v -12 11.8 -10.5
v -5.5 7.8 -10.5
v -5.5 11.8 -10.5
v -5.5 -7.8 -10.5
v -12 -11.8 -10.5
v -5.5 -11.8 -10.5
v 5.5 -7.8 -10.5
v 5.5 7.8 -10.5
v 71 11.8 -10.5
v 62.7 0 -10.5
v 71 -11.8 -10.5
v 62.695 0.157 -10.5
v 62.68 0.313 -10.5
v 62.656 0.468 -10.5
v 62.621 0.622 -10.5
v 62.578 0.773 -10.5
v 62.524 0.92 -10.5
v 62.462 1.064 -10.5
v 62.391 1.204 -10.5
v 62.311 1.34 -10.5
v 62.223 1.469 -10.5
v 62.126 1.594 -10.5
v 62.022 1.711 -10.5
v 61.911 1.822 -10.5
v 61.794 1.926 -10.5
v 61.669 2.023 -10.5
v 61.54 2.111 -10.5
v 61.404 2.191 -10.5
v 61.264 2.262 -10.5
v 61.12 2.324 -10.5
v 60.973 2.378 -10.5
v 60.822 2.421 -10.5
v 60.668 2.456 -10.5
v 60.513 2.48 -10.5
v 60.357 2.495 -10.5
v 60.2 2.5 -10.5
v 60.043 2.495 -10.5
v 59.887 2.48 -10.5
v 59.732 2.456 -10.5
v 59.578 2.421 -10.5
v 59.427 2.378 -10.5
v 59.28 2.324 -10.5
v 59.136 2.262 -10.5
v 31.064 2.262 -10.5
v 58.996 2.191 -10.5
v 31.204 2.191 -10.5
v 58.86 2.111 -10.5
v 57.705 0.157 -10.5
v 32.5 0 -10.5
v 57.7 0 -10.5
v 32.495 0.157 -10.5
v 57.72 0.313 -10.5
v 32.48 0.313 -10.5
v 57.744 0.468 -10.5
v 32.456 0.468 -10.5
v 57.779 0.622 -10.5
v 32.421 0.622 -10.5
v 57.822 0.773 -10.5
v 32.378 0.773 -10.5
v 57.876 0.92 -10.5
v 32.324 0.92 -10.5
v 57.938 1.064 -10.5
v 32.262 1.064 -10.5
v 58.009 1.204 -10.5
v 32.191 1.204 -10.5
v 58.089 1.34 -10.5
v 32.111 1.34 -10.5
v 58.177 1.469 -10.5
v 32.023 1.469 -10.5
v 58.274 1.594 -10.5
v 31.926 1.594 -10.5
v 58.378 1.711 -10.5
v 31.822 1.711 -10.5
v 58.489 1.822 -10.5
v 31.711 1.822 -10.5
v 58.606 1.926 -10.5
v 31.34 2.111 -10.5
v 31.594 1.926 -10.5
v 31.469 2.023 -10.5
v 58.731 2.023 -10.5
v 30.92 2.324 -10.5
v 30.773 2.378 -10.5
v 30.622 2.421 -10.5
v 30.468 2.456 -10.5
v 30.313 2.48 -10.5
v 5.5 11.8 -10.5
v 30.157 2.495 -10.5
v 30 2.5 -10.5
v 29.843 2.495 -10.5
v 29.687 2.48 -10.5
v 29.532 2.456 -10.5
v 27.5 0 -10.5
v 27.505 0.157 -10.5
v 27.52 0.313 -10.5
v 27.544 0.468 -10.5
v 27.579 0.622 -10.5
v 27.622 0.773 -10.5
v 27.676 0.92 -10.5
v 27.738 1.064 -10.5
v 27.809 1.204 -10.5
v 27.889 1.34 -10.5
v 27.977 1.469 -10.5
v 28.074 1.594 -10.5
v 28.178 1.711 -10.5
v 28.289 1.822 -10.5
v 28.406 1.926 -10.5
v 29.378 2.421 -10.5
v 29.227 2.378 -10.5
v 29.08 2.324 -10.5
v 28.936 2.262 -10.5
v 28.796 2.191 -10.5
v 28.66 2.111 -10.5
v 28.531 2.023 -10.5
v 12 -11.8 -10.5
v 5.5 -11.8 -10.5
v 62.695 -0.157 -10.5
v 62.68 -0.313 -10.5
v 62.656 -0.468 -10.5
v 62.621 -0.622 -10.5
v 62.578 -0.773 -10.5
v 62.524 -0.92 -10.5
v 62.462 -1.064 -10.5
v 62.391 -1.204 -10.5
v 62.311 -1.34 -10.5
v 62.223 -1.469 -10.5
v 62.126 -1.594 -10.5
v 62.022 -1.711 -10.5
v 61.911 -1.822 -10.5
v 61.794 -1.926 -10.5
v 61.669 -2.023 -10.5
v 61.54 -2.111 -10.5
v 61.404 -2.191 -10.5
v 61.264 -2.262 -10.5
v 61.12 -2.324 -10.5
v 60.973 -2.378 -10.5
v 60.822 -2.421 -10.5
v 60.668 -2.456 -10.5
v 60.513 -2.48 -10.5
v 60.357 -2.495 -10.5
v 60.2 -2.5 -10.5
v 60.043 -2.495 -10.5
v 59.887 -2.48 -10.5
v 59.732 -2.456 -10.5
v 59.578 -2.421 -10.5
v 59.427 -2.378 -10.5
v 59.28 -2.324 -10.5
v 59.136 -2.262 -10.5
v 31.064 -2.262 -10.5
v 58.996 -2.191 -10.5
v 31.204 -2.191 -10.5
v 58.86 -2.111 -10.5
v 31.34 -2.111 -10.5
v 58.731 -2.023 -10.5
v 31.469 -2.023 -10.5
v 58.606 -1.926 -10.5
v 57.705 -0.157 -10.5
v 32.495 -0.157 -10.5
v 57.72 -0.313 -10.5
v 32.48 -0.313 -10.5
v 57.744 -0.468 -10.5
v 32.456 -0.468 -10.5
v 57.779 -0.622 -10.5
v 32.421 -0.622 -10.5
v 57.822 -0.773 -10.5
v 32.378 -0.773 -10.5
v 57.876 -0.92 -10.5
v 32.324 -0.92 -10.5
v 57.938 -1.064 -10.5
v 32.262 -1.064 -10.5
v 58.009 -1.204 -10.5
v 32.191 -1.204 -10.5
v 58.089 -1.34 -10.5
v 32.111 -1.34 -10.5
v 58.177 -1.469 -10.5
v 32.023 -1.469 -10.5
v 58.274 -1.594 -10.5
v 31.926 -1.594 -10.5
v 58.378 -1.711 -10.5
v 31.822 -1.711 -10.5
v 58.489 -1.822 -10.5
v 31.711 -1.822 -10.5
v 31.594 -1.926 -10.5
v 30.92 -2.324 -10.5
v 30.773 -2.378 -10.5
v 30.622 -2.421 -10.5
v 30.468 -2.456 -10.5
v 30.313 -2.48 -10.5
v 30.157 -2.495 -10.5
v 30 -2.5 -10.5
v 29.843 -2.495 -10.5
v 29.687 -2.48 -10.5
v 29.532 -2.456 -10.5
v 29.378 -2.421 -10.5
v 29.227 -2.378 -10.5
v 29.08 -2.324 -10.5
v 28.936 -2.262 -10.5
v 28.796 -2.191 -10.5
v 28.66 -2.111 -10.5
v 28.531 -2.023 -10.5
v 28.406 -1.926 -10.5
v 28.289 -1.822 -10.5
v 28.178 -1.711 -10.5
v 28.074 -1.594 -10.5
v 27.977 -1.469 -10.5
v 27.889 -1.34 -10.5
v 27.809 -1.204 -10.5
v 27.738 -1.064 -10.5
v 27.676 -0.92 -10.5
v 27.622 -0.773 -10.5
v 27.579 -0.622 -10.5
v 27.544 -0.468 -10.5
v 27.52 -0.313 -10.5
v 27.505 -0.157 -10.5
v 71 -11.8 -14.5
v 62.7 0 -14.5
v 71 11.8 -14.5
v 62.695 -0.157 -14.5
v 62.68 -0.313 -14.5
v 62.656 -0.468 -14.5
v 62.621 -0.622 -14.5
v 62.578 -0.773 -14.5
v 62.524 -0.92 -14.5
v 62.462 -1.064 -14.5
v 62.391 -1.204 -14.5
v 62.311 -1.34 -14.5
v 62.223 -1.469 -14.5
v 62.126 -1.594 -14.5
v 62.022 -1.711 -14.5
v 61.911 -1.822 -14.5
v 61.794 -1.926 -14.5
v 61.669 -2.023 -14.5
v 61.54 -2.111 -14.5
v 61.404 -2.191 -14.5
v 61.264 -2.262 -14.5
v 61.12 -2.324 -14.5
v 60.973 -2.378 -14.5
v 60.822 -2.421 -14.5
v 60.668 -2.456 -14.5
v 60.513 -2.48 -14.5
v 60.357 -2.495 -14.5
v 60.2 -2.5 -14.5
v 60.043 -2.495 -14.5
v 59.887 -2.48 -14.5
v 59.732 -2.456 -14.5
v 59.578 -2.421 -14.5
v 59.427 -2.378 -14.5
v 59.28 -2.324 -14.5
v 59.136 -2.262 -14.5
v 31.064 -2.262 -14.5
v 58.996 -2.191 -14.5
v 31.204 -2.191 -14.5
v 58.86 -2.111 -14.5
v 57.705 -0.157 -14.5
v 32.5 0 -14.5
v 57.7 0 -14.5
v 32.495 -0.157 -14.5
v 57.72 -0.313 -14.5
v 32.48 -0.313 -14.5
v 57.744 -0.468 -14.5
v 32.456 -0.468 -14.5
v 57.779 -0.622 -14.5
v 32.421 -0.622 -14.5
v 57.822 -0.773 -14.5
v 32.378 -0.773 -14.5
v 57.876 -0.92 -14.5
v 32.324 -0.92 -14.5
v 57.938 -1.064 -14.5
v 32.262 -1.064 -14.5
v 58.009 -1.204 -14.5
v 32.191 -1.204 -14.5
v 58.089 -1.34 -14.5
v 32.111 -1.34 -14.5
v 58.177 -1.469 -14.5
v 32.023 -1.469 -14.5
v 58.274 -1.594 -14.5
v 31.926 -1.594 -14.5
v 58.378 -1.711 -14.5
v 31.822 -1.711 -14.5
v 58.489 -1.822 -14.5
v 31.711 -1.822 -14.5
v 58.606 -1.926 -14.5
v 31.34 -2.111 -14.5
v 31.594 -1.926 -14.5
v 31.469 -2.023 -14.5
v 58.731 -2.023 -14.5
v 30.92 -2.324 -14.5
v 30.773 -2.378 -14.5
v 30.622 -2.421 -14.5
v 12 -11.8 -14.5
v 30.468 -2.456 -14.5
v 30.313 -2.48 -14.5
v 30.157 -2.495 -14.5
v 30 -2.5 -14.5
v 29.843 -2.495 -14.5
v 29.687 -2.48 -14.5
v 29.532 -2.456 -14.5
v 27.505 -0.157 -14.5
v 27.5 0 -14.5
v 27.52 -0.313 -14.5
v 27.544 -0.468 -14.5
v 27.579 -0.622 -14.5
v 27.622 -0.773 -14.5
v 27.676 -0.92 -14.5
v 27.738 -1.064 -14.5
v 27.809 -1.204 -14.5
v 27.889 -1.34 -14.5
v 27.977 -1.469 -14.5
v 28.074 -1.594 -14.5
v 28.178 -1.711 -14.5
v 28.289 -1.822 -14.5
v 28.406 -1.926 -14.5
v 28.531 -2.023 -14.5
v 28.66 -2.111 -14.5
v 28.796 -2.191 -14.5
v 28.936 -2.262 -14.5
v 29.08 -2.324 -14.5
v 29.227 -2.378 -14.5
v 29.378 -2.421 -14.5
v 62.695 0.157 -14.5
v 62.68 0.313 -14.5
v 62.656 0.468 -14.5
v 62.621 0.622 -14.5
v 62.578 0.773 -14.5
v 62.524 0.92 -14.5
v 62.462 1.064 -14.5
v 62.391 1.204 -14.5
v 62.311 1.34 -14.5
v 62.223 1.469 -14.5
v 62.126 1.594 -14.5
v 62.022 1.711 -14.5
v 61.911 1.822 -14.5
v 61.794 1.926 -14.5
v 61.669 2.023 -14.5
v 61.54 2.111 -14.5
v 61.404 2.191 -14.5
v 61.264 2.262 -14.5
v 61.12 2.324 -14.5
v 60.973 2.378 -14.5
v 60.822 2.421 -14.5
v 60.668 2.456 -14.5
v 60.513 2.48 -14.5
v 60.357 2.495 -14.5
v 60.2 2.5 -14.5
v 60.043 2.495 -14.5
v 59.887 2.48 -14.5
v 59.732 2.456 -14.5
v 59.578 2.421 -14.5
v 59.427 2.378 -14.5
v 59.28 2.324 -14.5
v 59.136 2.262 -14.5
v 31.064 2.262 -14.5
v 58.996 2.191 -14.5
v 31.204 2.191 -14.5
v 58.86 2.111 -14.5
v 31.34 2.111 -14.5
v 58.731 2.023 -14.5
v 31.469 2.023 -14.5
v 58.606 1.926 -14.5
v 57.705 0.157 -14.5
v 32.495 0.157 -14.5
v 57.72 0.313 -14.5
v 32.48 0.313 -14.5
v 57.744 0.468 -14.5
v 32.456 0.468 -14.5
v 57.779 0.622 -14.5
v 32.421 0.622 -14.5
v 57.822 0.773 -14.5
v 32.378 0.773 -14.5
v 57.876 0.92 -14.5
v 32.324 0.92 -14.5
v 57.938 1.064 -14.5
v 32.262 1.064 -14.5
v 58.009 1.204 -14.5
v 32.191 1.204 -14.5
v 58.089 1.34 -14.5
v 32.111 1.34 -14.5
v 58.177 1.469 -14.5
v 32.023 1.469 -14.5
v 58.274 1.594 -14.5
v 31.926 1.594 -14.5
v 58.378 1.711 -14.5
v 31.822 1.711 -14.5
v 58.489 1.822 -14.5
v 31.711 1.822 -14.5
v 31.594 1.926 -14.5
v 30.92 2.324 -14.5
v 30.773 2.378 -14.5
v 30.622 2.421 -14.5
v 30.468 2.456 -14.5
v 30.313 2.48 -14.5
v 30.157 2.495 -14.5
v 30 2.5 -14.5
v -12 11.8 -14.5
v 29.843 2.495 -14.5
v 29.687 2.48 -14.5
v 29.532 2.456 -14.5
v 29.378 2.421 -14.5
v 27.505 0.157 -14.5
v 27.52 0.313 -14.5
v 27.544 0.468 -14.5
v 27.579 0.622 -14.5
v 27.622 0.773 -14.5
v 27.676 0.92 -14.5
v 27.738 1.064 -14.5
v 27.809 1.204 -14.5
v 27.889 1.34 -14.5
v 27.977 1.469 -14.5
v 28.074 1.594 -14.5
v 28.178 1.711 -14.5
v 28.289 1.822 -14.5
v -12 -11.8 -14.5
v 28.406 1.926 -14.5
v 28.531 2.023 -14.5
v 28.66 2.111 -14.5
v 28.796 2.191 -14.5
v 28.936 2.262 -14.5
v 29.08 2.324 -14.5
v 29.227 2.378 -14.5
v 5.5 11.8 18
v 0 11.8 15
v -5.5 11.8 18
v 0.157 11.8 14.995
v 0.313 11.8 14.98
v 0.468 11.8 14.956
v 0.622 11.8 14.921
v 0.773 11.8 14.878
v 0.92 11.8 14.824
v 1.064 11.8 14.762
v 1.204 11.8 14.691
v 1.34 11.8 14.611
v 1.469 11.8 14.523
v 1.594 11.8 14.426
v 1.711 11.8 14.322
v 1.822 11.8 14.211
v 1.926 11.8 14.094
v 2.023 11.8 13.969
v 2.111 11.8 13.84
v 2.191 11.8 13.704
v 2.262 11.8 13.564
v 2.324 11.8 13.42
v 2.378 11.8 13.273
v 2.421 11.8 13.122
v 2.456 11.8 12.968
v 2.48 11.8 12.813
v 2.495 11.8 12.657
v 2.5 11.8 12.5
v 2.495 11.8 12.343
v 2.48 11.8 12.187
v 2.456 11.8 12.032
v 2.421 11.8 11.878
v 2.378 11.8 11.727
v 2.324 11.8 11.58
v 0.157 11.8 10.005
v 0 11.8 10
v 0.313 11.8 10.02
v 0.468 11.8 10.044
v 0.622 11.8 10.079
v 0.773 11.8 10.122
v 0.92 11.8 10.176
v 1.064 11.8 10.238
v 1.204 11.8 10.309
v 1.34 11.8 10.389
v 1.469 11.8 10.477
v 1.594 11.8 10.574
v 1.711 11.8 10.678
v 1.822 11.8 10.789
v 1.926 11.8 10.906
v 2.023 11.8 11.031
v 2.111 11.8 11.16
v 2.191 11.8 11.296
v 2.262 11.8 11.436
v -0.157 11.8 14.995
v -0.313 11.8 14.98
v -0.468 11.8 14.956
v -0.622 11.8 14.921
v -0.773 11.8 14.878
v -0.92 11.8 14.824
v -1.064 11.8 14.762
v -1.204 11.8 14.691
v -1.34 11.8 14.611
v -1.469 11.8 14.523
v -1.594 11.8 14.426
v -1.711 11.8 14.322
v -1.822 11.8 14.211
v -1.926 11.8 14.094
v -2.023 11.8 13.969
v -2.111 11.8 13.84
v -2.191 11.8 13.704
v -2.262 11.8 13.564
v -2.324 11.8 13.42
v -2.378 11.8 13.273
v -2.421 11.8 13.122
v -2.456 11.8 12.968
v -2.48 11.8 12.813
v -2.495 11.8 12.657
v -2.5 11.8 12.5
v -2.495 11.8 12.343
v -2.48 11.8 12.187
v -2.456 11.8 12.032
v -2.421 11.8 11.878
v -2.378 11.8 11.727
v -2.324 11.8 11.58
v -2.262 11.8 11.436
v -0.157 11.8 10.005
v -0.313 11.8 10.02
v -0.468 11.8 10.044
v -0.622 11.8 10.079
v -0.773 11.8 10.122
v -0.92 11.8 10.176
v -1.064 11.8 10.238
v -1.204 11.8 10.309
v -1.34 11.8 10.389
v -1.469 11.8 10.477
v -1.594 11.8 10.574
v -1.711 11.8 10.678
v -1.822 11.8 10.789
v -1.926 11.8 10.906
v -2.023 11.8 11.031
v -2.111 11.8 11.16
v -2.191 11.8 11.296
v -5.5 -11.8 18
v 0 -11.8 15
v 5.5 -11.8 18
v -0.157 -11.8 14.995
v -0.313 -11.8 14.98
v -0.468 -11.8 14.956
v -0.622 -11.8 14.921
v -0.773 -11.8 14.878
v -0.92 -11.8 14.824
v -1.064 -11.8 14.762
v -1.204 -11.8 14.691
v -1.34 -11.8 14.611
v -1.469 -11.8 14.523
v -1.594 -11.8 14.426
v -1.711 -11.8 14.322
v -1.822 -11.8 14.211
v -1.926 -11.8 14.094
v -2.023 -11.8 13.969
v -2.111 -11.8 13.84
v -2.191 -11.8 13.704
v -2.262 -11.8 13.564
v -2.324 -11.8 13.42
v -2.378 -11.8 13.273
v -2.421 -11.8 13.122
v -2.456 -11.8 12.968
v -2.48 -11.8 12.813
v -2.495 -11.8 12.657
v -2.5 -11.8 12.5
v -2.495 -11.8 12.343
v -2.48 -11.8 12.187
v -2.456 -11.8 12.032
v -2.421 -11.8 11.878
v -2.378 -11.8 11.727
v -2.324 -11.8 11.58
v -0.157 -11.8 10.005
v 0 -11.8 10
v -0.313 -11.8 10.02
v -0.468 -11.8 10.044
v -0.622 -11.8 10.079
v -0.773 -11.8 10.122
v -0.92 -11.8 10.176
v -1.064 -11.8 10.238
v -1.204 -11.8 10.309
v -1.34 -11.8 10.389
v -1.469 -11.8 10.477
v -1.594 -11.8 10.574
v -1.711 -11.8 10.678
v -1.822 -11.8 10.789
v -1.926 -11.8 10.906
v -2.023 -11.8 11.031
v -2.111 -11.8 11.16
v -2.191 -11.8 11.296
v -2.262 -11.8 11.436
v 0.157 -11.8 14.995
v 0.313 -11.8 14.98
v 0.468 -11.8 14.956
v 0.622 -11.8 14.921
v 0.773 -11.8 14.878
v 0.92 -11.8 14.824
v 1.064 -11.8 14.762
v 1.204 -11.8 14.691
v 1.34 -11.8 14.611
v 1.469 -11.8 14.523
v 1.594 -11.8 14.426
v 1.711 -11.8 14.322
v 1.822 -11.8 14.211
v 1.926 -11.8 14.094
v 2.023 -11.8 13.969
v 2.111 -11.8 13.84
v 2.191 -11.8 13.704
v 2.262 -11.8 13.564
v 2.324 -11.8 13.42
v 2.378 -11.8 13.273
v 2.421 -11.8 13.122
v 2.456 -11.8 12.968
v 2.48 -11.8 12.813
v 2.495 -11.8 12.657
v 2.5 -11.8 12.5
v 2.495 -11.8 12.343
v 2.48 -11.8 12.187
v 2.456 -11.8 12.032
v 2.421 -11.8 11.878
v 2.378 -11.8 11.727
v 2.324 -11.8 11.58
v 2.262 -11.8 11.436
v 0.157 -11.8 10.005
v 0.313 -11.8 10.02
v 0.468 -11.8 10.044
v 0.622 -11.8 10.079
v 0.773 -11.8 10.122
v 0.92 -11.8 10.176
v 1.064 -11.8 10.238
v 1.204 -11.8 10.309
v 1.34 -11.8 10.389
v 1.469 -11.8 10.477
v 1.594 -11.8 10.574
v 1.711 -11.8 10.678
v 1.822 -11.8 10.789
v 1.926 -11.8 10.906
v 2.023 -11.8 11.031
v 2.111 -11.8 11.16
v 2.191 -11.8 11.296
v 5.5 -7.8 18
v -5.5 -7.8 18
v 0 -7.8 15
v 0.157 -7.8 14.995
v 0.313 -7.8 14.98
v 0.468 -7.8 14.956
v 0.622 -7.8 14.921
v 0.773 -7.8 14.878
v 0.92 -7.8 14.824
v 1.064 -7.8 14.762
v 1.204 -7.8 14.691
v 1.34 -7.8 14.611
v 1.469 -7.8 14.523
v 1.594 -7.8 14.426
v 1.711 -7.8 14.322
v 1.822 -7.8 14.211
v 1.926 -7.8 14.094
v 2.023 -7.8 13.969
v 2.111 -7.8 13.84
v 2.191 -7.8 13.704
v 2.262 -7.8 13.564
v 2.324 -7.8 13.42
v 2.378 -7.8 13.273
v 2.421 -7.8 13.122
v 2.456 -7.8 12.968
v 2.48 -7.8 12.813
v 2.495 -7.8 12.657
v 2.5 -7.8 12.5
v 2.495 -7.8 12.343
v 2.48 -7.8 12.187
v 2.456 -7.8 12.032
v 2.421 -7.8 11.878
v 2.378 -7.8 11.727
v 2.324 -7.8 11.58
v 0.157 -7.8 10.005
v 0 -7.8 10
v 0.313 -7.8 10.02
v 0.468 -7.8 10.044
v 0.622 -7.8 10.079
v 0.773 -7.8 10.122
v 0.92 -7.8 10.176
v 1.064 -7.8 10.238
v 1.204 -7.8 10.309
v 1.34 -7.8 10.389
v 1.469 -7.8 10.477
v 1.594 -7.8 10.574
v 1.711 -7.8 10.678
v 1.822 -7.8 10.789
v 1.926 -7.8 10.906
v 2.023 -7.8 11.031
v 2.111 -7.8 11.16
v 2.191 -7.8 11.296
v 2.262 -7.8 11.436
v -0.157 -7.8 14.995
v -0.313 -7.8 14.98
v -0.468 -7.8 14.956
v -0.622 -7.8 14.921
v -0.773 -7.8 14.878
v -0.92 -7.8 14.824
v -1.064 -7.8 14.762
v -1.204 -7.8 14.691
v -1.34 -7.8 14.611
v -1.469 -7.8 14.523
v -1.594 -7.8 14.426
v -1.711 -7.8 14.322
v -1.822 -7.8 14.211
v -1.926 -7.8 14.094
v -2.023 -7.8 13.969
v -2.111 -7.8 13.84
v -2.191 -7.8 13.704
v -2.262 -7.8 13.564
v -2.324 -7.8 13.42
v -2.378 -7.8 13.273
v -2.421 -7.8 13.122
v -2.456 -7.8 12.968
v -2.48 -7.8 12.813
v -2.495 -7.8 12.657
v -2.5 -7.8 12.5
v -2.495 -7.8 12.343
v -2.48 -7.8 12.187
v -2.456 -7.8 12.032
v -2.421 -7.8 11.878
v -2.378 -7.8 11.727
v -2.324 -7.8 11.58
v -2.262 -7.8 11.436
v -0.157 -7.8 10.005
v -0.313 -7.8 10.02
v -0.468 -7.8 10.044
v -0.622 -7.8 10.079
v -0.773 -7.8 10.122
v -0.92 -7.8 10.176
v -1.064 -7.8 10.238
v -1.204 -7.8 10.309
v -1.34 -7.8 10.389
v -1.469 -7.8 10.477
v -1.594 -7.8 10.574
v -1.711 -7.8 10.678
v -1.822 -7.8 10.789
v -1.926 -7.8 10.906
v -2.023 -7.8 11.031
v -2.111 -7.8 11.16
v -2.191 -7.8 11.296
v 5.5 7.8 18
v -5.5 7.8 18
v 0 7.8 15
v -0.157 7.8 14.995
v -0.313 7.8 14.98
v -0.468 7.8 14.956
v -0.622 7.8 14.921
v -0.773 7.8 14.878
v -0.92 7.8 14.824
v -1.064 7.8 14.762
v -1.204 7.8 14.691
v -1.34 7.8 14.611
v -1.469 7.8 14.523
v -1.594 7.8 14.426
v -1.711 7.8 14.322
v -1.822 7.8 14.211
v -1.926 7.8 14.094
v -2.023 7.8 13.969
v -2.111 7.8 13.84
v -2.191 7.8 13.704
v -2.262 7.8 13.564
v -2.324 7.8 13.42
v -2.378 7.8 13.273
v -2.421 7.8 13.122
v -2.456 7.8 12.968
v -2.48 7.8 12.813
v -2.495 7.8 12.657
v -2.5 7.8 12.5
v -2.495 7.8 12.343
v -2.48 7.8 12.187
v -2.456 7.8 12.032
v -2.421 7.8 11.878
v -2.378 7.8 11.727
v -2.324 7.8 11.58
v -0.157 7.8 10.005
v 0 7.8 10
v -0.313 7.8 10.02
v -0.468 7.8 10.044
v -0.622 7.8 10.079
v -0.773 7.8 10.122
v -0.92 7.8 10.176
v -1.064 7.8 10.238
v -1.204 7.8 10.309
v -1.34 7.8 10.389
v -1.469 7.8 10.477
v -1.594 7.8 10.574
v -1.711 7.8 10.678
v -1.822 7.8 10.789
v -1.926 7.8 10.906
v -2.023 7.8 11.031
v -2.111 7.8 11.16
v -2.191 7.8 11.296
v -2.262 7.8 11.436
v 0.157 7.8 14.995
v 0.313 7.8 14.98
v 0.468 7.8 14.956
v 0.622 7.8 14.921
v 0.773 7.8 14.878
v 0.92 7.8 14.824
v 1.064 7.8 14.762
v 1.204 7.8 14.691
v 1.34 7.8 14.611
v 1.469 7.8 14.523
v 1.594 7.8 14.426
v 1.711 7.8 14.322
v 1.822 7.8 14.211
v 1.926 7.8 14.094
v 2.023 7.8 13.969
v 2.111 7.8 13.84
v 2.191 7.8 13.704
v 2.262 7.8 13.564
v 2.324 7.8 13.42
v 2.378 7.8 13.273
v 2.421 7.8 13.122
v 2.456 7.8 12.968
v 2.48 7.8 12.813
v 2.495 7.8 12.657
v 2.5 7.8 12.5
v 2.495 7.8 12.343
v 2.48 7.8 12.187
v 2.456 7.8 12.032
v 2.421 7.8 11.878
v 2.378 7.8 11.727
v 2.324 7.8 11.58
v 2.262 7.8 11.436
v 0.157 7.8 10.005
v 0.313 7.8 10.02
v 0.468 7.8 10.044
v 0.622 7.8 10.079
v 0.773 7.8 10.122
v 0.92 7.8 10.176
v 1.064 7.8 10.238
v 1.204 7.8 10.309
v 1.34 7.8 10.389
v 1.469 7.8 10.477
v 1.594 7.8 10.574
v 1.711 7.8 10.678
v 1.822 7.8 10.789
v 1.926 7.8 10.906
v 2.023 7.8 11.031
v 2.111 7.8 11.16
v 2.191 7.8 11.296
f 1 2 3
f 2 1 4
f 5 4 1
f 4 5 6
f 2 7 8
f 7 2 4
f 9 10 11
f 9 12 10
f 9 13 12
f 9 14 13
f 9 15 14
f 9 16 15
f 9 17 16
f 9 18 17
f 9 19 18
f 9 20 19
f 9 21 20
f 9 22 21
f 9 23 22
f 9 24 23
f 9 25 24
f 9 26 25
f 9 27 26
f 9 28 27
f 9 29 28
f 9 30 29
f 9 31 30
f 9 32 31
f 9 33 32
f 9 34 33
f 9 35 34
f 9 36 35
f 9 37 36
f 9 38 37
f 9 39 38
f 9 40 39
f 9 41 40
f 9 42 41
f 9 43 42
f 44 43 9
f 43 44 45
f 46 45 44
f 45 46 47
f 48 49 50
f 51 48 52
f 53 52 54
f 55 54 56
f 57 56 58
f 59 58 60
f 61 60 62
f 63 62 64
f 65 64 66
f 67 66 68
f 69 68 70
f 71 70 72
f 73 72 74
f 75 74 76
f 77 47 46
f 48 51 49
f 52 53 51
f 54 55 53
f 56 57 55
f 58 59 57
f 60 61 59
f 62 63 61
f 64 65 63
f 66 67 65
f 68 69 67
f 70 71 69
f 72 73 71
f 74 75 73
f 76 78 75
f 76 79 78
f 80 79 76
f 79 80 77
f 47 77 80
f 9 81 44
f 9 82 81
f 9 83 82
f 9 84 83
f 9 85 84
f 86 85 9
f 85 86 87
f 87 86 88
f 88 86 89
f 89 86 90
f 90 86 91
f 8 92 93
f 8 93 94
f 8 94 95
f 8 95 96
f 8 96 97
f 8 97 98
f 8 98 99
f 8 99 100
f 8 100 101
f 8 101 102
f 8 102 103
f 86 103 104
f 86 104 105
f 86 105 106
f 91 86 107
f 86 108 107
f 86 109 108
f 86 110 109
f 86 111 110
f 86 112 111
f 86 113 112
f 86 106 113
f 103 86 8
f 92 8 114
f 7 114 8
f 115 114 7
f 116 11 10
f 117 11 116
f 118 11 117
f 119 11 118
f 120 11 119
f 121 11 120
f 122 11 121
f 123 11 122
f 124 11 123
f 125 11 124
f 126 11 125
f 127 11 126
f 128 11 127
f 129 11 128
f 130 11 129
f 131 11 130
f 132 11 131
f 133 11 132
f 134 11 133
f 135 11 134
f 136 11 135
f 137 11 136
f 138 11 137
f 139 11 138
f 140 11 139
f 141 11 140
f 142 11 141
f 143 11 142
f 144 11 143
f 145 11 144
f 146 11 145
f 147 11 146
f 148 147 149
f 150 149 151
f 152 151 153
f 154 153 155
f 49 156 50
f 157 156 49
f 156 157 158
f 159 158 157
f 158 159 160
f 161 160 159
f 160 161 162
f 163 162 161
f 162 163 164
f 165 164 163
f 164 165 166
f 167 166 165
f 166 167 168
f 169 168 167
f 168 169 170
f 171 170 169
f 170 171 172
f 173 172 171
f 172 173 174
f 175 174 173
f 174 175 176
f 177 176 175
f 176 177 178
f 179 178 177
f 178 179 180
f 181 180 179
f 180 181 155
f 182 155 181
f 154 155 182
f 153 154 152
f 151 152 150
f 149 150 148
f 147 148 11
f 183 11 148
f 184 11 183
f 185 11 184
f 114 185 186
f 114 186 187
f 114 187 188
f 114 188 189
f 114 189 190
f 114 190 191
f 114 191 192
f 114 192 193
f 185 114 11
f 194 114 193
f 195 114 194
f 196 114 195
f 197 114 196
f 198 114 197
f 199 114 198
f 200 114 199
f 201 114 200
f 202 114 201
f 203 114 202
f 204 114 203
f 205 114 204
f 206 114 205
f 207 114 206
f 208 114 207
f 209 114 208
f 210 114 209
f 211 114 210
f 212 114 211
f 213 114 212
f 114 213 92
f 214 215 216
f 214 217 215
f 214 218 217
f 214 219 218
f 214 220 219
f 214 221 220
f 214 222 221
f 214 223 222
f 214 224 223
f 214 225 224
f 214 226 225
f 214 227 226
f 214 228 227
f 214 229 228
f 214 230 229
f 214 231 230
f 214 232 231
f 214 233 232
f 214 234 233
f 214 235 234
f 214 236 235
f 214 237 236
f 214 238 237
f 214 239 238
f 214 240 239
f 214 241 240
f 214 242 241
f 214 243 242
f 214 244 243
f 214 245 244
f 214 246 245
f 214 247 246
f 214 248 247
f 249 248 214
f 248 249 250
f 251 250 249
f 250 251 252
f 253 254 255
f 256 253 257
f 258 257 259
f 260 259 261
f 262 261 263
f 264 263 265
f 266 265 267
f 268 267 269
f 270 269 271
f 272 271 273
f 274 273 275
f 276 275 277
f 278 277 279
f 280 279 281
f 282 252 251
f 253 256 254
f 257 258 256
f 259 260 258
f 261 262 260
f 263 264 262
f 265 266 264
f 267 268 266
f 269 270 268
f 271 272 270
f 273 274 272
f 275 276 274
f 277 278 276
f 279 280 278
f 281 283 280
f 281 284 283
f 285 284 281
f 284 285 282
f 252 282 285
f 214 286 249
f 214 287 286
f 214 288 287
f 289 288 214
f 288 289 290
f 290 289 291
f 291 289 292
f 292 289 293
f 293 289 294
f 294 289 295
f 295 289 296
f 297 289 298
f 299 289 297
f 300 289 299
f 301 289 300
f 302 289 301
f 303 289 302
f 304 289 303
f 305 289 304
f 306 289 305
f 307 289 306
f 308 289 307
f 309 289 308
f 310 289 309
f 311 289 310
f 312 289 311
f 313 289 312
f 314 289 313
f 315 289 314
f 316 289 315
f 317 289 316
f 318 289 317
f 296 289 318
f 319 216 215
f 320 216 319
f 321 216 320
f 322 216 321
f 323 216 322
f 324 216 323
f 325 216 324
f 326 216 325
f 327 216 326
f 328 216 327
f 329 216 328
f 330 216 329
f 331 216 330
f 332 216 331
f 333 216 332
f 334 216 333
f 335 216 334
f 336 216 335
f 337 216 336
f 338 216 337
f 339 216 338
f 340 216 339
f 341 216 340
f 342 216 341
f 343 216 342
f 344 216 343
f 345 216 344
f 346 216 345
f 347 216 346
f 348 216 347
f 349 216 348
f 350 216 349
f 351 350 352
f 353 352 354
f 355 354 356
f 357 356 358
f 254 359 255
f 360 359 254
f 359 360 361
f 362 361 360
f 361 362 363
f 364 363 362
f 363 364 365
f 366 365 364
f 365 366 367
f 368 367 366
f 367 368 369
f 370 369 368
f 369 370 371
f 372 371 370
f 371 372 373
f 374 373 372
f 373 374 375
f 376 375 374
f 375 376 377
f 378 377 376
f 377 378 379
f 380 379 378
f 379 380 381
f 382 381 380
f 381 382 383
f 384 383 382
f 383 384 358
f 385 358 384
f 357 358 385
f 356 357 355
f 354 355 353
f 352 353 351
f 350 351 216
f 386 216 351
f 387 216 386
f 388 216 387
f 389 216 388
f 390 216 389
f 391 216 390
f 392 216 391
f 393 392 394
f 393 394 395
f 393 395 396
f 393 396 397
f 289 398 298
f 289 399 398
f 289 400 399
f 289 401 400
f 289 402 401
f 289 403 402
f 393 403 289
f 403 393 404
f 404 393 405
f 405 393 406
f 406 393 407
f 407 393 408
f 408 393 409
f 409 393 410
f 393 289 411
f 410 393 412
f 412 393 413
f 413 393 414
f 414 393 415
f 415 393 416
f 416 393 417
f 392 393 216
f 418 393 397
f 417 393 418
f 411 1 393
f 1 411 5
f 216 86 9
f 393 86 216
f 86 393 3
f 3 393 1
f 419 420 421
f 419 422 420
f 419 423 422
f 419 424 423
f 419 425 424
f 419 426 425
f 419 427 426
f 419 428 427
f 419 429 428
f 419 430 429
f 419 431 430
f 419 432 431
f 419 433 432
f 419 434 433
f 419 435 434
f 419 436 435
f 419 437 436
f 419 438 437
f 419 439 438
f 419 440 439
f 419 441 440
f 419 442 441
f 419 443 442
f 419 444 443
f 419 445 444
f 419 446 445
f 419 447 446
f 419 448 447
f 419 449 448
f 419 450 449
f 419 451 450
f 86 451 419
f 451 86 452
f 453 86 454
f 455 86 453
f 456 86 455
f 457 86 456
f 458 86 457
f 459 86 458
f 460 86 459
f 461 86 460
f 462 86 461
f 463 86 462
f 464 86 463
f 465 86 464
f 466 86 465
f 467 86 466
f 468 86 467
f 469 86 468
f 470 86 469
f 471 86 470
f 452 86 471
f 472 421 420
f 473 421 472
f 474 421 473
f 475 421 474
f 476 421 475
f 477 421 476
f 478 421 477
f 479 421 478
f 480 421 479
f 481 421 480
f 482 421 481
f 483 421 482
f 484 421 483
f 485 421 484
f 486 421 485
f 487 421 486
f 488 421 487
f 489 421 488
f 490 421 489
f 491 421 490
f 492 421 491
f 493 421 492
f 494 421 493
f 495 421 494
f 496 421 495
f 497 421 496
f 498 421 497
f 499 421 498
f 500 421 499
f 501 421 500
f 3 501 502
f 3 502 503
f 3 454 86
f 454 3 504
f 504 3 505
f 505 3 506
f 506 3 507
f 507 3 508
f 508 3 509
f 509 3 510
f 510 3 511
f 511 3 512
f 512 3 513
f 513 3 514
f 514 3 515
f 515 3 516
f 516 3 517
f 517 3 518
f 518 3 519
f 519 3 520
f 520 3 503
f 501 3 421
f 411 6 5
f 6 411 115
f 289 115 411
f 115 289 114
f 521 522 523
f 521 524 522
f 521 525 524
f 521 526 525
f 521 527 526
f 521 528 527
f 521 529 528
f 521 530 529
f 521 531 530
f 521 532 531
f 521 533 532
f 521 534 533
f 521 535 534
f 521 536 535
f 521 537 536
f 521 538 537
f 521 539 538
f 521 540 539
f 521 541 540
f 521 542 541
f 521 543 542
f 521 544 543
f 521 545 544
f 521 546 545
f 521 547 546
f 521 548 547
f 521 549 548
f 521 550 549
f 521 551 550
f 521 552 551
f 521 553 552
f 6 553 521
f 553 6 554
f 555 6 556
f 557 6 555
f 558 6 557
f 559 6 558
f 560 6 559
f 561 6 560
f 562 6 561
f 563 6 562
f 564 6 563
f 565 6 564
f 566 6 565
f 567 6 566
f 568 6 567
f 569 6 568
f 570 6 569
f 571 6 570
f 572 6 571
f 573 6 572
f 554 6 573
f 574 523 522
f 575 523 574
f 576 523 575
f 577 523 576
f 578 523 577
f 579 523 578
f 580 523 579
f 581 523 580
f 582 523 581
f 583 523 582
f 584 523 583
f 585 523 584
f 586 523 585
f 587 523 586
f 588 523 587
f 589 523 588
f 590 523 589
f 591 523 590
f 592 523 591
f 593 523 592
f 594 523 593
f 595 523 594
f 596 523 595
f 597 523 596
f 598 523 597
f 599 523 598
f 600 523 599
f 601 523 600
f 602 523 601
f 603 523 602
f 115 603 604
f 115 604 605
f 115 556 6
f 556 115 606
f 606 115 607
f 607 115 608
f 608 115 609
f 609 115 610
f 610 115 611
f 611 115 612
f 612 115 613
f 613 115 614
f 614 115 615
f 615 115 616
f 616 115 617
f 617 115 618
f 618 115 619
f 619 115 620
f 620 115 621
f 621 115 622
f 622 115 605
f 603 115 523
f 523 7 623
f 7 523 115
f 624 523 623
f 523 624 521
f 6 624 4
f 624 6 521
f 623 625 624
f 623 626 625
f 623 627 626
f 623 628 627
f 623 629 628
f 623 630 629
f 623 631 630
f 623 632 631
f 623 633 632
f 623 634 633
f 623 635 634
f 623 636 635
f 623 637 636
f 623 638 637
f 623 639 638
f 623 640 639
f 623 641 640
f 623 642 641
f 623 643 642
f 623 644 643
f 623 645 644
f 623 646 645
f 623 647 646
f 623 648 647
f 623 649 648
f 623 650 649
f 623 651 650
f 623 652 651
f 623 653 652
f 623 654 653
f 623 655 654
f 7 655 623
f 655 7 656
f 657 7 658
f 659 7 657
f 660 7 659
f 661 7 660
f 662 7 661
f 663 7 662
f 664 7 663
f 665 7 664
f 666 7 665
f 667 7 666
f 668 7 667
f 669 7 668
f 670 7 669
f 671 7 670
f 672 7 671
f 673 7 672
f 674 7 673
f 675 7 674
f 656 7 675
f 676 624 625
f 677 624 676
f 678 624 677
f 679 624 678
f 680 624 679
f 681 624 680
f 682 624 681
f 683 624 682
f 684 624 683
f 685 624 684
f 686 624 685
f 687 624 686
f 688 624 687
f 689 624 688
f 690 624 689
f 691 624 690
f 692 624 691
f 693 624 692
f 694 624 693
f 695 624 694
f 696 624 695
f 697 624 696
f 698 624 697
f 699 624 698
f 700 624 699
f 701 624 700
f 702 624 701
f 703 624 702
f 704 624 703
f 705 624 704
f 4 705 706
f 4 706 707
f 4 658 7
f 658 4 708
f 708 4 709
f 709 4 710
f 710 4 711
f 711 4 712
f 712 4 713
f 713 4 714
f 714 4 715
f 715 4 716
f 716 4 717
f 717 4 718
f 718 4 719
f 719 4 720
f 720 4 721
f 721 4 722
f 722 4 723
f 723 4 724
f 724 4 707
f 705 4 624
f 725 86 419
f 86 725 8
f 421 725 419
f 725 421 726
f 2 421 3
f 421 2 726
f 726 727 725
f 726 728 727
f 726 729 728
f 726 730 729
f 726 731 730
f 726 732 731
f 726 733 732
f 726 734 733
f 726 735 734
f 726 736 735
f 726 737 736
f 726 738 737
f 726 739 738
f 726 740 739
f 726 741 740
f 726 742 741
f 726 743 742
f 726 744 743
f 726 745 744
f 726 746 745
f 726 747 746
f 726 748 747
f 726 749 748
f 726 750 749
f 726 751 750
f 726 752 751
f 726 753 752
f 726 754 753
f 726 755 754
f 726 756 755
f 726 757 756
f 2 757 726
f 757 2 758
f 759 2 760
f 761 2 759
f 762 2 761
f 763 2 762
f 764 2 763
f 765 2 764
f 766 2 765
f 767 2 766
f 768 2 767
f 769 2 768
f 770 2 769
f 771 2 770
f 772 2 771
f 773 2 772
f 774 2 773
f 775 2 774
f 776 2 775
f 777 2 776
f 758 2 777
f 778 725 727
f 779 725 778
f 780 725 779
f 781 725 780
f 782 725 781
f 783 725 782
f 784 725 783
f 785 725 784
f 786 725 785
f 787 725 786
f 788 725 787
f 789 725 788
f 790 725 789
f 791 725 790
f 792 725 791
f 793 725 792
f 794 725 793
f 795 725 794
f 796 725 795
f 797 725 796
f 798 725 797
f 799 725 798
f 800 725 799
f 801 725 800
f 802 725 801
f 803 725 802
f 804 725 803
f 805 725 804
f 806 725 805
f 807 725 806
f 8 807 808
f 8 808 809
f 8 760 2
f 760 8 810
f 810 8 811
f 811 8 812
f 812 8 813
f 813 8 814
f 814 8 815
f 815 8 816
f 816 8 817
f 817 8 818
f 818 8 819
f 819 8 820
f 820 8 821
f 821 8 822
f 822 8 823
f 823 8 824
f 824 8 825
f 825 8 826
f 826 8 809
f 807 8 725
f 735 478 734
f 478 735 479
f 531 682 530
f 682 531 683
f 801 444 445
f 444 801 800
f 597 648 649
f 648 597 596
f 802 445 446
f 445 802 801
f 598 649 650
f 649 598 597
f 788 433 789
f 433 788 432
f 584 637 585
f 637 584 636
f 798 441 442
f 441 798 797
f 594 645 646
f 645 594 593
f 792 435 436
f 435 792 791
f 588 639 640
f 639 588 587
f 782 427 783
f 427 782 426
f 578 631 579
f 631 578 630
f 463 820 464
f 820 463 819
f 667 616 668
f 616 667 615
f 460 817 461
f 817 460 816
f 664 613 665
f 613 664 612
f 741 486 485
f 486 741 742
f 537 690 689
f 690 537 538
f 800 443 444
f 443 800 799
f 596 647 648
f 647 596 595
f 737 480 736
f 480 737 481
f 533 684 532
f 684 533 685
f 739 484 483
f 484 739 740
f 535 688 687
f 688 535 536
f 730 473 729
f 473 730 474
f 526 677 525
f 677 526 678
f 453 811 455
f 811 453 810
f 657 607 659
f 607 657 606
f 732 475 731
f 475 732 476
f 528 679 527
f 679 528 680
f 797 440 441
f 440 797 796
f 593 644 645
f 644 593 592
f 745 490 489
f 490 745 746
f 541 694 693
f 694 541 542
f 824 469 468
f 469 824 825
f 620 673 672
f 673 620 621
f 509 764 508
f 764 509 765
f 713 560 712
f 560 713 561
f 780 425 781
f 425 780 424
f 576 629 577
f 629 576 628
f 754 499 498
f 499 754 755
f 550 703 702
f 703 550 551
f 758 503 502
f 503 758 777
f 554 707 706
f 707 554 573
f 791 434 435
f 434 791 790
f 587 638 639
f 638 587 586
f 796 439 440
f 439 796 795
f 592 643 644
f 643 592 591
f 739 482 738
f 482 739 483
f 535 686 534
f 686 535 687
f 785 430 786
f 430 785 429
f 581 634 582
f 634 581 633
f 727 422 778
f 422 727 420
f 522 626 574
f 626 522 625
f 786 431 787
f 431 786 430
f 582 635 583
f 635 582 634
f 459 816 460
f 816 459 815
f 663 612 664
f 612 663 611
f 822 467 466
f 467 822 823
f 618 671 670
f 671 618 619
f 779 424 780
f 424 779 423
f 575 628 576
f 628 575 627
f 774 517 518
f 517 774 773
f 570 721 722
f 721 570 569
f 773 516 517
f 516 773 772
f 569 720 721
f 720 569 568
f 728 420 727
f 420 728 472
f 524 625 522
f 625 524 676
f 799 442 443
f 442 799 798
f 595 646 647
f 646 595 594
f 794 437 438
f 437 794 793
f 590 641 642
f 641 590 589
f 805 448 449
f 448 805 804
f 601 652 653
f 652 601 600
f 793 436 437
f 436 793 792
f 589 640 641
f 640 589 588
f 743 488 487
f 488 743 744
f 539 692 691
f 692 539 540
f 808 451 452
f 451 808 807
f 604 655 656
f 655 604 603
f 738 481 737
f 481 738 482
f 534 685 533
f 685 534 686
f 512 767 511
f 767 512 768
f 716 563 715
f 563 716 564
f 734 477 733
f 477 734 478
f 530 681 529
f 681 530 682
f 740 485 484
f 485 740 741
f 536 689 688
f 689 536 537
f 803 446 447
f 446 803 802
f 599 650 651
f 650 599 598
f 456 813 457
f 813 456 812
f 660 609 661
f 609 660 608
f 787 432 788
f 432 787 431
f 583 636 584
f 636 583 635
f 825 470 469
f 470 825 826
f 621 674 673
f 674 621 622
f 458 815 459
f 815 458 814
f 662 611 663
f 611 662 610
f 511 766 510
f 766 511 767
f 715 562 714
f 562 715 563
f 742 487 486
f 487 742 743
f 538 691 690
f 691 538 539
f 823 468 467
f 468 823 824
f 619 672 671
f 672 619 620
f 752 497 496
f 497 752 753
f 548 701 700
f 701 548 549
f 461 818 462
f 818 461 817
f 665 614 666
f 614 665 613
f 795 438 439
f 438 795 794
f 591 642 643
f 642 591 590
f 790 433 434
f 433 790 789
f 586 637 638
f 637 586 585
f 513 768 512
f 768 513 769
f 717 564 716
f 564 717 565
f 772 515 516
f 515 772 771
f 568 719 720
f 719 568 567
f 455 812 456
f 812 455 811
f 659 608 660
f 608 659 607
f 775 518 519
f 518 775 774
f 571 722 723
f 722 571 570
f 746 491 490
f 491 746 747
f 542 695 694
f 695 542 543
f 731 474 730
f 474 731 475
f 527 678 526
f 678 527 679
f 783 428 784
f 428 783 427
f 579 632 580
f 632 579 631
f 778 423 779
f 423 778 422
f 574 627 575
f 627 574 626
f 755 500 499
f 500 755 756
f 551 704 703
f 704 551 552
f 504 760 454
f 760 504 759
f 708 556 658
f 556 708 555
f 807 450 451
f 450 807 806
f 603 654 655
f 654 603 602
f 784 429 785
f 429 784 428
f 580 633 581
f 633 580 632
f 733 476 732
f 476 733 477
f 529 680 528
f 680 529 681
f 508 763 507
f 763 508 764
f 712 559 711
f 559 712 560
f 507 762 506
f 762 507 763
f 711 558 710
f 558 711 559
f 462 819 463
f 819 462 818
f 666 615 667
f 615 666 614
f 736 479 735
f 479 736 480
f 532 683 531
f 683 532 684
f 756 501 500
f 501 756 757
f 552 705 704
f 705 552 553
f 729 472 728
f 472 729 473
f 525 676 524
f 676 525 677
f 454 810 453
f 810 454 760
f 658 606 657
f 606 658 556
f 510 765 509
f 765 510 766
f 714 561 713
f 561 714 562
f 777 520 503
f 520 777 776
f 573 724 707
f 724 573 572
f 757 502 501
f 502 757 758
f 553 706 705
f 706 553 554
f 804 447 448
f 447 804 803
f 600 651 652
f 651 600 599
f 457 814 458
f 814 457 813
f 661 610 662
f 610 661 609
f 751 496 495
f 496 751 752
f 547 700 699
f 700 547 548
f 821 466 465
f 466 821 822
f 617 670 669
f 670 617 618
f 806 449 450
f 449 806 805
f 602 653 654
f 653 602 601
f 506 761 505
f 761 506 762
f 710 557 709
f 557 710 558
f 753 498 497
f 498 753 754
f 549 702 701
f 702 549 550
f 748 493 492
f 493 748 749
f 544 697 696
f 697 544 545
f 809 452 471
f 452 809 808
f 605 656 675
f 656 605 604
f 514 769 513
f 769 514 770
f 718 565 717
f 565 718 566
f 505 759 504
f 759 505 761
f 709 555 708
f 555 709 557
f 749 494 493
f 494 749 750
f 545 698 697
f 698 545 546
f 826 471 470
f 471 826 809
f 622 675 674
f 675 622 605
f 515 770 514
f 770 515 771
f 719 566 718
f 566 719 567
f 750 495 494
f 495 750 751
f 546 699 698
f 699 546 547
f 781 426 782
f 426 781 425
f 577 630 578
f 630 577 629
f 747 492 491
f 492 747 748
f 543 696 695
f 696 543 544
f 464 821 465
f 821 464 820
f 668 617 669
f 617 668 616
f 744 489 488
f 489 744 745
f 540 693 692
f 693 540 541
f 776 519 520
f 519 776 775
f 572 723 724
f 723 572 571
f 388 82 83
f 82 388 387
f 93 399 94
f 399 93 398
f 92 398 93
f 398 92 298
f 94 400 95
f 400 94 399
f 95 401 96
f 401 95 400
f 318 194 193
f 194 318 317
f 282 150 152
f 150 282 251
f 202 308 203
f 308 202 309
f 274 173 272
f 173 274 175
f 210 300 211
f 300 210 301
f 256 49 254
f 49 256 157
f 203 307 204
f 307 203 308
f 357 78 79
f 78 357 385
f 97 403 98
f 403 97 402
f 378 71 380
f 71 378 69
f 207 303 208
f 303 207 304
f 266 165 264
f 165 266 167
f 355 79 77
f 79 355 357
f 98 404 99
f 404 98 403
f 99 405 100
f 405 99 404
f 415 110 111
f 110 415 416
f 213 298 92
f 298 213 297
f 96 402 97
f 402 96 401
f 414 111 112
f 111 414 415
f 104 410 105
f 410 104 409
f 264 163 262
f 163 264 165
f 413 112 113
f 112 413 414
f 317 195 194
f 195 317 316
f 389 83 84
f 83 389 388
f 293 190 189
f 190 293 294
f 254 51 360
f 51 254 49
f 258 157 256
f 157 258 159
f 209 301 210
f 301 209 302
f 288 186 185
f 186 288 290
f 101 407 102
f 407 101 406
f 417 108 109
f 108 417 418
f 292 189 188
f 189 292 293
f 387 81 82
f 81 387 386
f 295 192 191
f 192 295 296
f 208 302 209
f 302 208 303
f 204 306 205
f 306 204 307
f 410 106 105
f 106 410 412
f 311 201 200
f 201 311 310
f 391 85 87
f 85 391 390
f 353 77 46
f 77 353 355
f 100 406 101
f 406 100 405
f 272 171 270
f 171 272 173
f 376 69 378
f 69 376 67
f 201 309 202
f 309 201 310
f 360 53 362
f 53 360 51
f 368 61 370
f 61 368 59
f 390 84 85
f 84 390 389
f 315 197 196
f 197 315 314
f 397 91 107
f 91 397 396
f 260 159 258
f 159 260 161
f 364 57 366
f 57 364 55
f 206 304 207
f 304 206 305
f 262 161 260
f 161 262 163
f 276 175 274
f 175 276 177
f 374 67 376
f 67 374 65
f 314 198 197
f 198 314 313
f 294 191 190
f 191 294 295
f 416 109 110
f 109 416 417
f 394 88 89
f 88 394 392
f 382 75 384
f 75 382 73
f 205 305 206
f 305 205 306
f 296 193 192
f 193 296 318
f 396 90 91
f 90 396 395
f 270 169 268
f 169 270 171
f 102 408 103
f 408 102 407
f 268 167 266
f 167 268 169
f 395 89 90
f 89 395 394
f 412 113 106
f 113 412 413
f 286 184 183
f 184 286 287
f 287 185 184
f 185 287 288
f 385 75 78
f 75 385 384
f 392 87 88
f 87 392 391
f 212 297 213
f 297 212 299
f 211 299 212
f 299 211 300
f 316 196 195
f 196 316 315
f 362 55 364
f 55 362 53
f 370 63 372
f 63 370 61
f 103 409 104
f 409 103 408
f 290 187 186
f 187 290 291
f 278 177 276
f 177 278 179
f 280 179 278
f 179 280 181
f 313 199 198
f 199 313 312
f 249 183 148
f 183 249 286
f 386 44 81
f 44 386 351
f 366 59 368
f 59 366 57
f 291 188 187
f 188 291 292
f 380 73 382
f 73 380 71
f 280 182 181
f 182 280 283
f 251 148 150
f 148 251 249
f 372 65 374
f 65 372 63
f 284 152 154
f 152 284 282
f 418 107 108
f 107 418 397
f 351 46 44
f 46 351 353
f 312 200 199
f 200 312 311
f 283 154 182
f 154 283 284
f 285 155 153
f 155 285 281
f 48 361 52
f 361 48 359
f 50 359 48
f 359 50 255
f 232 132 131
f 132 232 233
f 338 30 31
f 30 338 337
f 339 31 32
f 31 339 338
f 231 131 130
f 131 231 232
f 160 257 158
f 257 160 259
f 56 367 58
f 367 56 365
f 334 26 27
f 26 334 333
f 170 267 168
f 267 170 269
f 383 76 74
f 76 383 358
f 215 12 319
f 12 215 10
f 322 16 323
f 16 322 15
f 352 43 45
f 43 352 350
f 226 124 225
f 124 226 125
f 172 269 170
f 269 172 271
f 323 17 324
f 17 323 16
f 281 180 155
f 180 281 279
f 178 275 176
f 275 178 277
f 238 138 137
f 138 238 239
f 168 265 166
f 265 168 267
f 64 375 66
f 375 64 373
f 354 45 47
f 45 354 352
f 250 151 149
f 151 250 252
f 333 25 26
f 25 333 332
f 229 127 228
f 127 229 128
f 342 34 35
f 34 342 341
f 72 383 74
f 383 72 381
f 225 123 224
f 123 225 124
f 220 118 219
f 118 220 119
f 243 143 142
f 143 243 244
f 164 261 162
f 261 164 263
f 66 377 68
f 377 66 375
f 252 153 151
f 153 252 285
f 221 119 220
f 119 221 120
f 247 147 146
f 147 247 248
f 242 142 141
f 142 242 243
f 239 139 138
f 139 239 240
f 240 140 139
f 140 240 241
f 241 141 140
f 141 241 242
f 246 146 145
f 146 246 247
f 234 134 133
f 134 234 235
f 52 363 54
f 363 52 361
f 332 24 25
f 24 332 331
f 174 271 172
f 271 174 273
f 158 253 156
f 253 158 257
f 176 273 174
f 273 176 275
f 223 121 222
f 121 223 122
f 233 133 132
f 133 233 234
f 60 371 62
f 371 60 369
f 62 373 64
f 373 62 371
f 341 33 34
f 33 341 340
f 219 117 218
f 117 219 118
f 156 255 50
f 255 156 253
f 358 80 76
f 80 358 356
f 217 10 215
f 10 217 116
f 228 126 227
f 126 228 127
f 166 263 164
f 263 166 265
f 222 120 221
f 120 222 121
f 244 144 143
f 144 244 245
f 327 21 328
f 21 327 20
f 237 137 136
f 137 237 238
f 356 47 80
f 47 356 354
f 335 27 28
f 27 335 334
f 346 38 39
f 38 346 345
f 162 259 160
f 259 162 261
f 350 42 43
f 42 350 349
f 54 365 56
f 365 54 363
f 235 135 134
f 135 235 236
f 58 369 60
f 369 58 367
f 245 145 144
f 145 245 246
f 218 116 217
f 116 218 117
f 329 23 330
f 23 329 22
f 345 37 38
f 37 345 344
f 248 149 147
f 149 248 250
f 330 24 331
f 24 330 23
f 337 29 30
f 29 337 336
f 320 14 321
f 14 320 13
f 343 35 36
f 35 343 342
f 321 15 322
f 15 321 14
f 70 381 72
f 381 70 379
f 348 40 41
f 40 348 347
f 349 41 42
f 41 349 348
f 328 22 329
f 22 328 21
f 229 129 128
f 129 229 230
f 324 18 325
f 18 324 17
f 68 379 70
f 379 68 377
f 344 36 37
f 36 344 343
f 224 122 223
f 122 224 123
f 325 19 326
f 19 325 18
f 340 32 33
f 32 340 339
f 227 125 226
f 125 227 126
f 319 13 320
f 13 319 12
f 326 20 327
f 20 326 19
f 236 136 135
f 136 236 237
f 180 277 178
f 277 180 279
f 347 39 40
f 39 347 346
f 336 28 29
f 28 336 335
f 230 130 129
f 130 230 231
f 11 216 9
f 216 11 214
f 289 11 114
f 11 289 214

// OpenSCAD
$fn=100;


//difference(){
//rotate([0,0,90])
//docking();
//
//translate([-40, -20, -10])
//cube([80,100,50]);
//}

//bump_switch();

//cylinder(h=17, d=2.6, center=true);


//cylinder(h=3, d=76.2);
//
//cylinder(h=10, d=20);



translate([0,-16,5.5])
plug_holder1();


//color("blue", alpha=0.5){
//    cube([11,15.9,20.9], center=true);
//}
//
//plug_switch();

 
//translate([-0.5,-5, 2])
//load_metal_bar();

//difference()
//{
//dock_walmart();
////
////translate([10,-25, 10])
////cube([60,100,60], center=true);
//}

//measurement check
//translate([0,15, 16.4])
//cube([70,30,26.8], center=true);

//rotate([0,0,90]) {
//    docking_screw(); 
// simplebar(conn_h=3);
//// translate([40,3,1.5+1.5+2.0])
////    cube([10,24.5+8,3], center=true); 
//}




module bump_switch(){
    h2h_outer=12.3;
    h2h_d=9.4;
    
    
    d=13;
    w=18;
    l=8;
    difference(){
    union(){
        translate([0,0,d/2+1-0.1 ])
        cube([l, w, 2], center=true);
        translate([0,0,-d/2 - 1+0.1 ])
        cube([l, w, 2], center=true);
        
        translate([-3-2.5,0,0])
        cube([3,w-6,d+3.8], center=true);
        
        translate([-11, 0, 0])
        rotate([0,90,0])
        cylinder(h=8, d=8.4, center=true);
    }
    

    
    translate([1.5, 0, -5]){
        translate([0, h2h_d/2, 0])
        cylinder(h=30, d=2.7, center=true);
        translate([0, -h2h_d/2, 0])
        cylinder(h=30, d=2.7, center=true);
    }
    
}

    //measurement

//    translate([4,0,5])
//    color("red", alpha=0.4)
//    cube([4,h2h_outer, d], center=true);
    
    
}

module dock_walmart(){
    mid_h=26.5-1-0.5;  
 
 
//mid_h=27.3;  // mid space+2bar

//23.45+2*1.9
   
   difference()
    { 
    union(){
clamp_bar();
translate([0,0,mid_h+ 6.4])
rotate([0,180,0])
clamp_bar();


translate([25.5,0, 1 ])
cube([22,94.4,4], center=true);  
    
translate([25.5,0, 30.38 ])
cube([22,94.4,4], center=true);  
    
translate([34.5,0,16 ])
cube([4,94.4,31], center=true);  
    }
    
////conns
translate([30,-38 ,16]) 
rotate([0,90,0])
  cylinder(h=20, d=5  , center=true);
 
translate([30, 38 ,16]) 
rotate([0,90,0])
  cylinder(h=20, d=5  , center=true);
    
    
    translate([24,-38 ,16]) 
//rotate([0,90,0])
  cylinder(h=40, d=5  , center=true);
 
translate([24, 38 ,16]) 
//rotate([0,90,0])
  cylinder(h=40, d=5  , center=true);
    
    
}



}

module pillers(){
translate([12.25,-44.20,14])
cube([6,6,19], center=true);
translate([-12.25,-44.20,14])
cube([6,6,19], center=true);
}


module clamp_bar(){
    difference()
    {
rotate([0,0,90]) {
    
    difference(){
    union(){
cube([94.42, 24.5+6, 1.95], center=true); 

translate([40.2,0,1.5+3])
 cover();
    
translate([-42.2,0,1.5+3])
 cover();
}
    translate([-46,0,0])
    cube([10,4,20], center=true); //small cut
}
}

c=0.2; //clearence
translate([0,0,2])
cube([24.5+c,94.42+c ,1.95+c], center=true); //metal_bar size

}
}

module cover(){
    
    translate([1,0,-1.5])
    cube([12,24.5+6,6], center=true);
   
//    cube([10,24.5+8+10,3], center=true); 
//    translate([0,-14.763,-2])
//    cube([10,3,3], center=true);   
//     
//         translate([0, 14.763,-2])
//    cube([10,3,3], center=true);  
 
}

module load_metal_bar(){
scale(1020)
//rotate([0,0,90])
import("/home/ns/charger_design/metal_bar.stl", center=true);
    
    // translate([-5,10,0])
//cube([94.42, 24.5, 1.95], center=true); 
// 
}

module plug_switch(){
//    so far working good. 

translate([50,0,20])
rotate([0,90,0]) {
    
difference(){ 
    union(){ 
        difference()
        {
            translate([0,0,10])
        cylinder(h=40, r=13.6+2, center=true);
            translate([0, 0,10])
        cylinder(h=40+10 , r=13.6, center=true);
            
            translate([-20,0,5])
        cube([20, 40, 50+10], center=true);
        }
        
//        two sides

//        translate([-8,13.5,-20])
//        cube([10, 2 , 40]);
//
//        translate([-8,-13.5-2,-20])
//        cube([10, 2 , 40]);
    }

//    connector hole. 
    translate([0, 0,0])
    rotate([90,0,0])
    cylinder(h=50, d=3.5 , center=true);
       
}

    translate([16,0,40]){ 
        difference(){
        //base
        cube([4,20,100], center=true); 
        //    two holes. 
            translate([0, 0,6.5])
            rotate([0,90,0]) {
            cylinder(h=10,d=5.5, center=true);
                
                translate([-30, 0,0])
                cylinder(h=10,d=5.5, center=true);
            }
        } 
    }

}
}







module plug_holder1(){
w=11;
d=15.9-0.3;
h=21+8;
 
    
    difference()
    {
        
    union(){
    //base
    translate([0,14+2,-14-4])
    cube([24, d+8, 4], center=true); 
    
    //two sides
    translate([0,6.2,-2])
    cube([w, 4, h], center=true);

    translate([0, d+10.2,-2])
    cube([w, 4, h], center=true);
        

    }
        
        translate([0,15,7.0])
        rotate([90,0,0])
        cylinder(h=50, d=5 , center=true);
           
   }
   
   //base conn 
        rotate([0,90,0])
       translate([18,16,23.5]){ 
           //measurement. 
//            translate([-10,-15,-29])
//           cube([10,30,33]);
           
        difference(){
        //base
            translate([0,0,15])
        cube([4,d+8,65], center=true); 
        //    two holes. 
            translate([0, 0,6.5])
            rotate([0,90,0]) {
            cylinder(h=10,d=5, center=true);
                
                translate([-30.2, 0,0])
                cylinder(h=10,d=5, center=true);
            }
        } 
    }
   
   
   
}



module docking(){

mid_h=23.45;  //to reduce 0.6mmm
bar_h=1.9;    
conn_h=4;
    
//mid_h=27.3;  // mid space+2bar

//23.45+2*1.9
    
simplebar(conn_h=conn_h);
translate([0,0,mid_h+2*bar_h+conn_h])
simplebar(conn_h=conn_h);

//measurement check
//translate([20,15, 27.25/2+ conn_h/2])
//cube([70,30,27.3], center=true);


    //back connection
    translate([0, 32.8 , 20-4.35]) {
        difference(){
        cube([105,5,35.25], center=true);

            translate([0, 0,0])
            rotate([90, 0, 0]){
                translate([44-4,0,0])
                cylinder(h=20, d=5 , center=true);

                translate([-44+4,0,0])
                cylinder(h=20, d=5  , center=true);
            }
        }
    }
    
}

module simplebar(conn_h=3){ //bar connector
    
    
   yoff=20;
   difference(){
       translate([0,yoff/2,0])
    cube([95+10, 25+yoff, conn_h], center=true);

    translate([44-4,0,0])
    cylinder(h=20, d=5  , center=true);

    translate([-44+4,0,0])
    cylinder(h=20, d=5 , center=true);
       
           
//    translate([0,0,-3])
//cube([40,10+yoff,20], center=true);

    } 
    
    
//    translate([0,0,-3])
//cube([88,5,5], center=true);

//95-73=22/2=11
//95-7=88/2=44
}




module docking_screw(){

mid_h=23.45;  //to reduce 0.6mmm
bar_h=1.9;    
conn_h=4;
    
//mid_h=27.3;  // mid space+2bar

//23.45+2*1.9
    
simplebar(conn_h=conn_h);
translate([0,0,mid_h+2*bar_h+conn_h])
simplebar(conn_h=conn_h);

//measurement check
//translate([20,15, 27.25/2+ conn_h/2])
//cube([70,30,27.3], center=true);


    //back connection
    translate([0, 32.8 , 20-4.35]) {
        difference(){
        cube([105,5,35.25], center=true);

            translate([0, 0,0])
            rotate([90, 0, 0]){
                translate([44-4,0,0])
                cylinder(h=20, d=5 , center=true);

                translate([-44+4,0,0])
                cylinder(h=20, d=5  , center=true);
            }
        }
    }
    
}
